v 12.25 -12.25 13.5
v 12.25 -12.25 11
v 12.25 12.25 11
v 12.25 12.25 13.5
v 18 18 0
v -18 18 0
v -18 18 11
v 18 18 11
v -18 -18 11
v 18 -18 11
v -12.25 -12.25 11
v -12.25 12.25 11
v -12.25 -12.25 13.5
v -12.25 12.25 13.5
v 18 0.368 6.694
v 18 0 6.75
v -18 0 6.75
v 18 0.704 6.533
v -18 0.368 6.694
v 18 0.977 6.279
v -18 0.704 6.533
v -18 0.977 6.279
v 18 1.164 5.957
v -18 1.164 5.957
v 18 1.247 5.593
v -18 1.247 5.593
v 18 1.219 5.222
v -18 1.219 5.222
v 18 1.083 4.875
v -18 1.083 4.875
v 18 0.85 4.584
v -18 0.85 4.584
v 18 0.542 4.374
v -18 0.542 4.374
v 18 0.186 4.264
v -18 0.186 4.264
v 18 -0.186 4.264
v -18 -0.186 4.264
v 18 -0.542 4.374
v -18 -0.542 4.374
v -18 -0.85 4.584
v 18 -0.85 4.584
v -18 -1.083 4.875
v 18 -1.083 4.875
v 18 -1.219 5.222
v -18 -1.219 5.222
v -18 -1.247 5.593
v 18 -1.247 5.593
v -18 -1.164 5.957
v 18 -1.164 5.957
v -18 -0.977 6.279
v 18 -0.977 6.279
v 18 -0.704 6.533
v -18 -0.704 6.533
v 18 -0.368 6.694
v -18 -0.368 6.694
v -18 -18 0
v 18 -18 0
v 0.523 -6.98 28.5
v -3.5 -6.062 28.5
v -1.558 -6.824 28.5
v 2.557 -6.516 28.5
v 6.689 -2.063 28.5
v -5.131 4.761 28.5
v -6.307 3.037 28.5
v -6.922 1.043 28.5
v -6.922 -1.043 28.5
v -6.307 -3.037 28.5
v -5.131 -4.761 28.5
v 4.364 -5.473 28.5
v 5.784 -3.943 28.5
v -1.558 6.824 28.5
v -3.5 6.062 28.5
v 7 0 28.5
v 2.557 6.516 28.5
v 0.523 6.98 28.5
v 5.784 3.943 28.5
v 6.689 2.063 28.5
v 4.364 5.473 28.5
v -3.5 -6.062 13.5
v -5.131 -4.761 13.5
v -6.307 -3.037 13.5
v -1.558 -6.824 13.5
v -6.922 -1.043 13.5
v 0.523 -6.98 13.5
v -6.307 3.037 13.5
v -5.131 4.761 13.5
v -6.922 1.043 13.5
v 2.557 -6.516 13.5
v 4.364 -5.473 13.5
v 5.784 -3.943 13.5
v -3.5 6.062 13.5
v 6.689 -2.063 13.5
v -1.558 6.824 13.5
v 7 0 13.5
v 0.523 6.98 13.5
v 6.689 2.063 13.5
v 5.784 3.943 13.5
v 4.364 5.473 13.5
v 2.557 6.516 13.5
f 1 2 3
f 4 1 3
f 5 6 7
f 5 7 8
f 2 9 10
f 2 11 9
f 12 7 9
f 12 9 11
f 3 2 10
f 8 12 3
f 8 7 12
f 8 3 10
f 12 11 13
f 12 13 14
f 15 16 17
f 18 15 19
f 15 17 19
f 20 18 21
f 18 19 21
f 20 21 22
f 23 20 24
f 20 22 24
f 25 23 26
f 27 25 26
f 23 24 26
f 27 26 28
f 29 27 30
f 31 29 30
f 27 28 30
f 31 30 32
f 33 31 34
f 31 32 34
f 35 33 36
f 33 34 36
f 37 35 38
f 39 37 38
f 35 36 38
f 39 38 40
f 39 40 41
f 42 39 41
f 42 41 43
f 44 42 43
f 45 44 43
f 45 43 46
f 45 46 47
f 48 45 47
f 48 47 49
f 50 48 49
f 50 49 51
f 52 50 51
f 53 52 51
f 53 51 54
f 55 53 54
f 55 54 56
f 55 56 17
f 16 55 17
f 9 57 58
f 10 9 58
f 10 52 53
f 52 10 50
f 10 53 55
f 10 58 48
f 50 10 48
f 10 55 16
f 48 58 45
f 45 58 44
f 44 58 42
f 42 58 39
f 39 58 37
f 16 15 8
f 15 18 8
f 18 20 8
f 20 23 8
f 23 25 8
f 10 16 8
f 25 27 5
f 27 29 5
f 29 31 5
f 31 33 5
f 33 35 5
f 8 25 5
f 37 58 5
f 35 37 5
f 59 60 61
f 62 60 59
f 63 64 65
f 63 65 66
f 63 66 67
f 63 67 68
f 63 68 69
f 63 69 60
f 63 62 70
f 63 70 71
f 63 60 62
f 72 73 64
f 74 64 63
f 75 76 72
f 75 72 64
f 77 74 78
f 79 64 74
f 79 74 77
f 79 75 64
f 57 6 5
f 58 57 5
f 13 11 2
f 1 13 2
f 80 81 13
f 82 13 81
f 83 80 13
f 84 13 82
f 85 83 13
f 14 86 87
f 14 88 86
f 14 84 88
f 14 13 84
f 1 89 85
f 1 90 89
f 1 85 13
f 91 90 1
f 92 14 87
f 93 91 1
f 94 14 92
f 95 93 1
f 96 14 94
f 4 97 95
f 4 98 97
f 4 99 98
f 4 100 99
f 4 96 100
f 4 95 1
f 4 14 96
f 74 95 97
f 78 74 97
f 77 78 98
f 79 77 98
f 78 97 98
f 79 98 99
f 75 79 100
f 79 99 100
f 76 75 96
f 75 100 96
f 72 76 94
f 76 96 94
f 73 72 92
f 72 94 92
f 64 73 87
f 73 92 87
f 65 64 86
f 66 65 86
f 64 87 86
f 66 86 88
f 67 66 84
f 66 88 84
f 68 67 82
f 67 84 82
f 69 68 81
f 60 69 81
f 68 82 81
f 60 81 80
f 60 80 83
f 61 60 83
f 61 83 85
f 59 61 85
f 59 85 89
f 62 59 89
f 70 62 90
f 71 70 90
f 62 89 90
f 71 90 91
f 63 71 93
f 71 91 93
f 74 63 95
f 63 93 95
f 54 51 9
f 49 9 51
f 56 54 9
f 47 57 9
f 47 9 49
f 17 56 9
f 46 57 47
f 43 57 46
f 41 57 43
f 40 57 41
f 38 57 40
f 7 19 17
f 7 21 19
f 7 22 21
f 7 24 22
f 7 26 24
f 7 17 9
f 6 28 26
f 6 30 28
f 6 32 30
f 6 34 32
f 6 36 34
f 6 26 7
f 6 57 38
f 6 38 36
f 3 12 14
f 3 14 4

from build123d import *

# Parameters (mm, degrees)
SKETCH_1_W              = 36
SKETCH_1_H              = 36
EXTRUDE_1_DEPTH         = 11
SKETCH_2_W              = 24.5
SKETCH_2_H              = 24.5
EXTRUDE_2_DEPTH         = 2.5
SKETCH_3_R              = 7
EXTRUDE_3_DEPTH         = 15
HOLE_WIZARD_2_5_2_5_1_D = 2.5


with BuildPart() as part:
    # 草图1 → 凸台-拉伸1 (new body)
    with BuildSketch(Plane.XY):
        Rectangle(SKETCH_1_W, SKETCH_1_H)
    extrude(amount=EXTRUDE_1_DEPTH)

    # 草图2 → 凸台-拉伸2 (add)
    with BuildSketch(Plane.XY.offset(11)):
        Rectangle(SKETCH_2_W, SKETCH_2_H)
    extrude(amount=EXTRUDE_2_DEPTH)

    # 草图3 → 凸台-拉伸3 (add)
    with BuildSketch(Plane.XY.offset(13.5)):
        Circle(SKETCH_3_R)
    extrude(amount=EXTRUDE_3_DEPTH)

    # Ø2.5 (2.5) 直径孔1 (through all)
    with Locations(Plane(origin=(18, 0, 0), x_dir=(0, 0, -1), z_dir=(1, 0, 0))):
        with Locations((-5.5, 0)):
            Hole(HOLE_WIZARD_2_5_2_5_1_D / 2)


solid = part.part
